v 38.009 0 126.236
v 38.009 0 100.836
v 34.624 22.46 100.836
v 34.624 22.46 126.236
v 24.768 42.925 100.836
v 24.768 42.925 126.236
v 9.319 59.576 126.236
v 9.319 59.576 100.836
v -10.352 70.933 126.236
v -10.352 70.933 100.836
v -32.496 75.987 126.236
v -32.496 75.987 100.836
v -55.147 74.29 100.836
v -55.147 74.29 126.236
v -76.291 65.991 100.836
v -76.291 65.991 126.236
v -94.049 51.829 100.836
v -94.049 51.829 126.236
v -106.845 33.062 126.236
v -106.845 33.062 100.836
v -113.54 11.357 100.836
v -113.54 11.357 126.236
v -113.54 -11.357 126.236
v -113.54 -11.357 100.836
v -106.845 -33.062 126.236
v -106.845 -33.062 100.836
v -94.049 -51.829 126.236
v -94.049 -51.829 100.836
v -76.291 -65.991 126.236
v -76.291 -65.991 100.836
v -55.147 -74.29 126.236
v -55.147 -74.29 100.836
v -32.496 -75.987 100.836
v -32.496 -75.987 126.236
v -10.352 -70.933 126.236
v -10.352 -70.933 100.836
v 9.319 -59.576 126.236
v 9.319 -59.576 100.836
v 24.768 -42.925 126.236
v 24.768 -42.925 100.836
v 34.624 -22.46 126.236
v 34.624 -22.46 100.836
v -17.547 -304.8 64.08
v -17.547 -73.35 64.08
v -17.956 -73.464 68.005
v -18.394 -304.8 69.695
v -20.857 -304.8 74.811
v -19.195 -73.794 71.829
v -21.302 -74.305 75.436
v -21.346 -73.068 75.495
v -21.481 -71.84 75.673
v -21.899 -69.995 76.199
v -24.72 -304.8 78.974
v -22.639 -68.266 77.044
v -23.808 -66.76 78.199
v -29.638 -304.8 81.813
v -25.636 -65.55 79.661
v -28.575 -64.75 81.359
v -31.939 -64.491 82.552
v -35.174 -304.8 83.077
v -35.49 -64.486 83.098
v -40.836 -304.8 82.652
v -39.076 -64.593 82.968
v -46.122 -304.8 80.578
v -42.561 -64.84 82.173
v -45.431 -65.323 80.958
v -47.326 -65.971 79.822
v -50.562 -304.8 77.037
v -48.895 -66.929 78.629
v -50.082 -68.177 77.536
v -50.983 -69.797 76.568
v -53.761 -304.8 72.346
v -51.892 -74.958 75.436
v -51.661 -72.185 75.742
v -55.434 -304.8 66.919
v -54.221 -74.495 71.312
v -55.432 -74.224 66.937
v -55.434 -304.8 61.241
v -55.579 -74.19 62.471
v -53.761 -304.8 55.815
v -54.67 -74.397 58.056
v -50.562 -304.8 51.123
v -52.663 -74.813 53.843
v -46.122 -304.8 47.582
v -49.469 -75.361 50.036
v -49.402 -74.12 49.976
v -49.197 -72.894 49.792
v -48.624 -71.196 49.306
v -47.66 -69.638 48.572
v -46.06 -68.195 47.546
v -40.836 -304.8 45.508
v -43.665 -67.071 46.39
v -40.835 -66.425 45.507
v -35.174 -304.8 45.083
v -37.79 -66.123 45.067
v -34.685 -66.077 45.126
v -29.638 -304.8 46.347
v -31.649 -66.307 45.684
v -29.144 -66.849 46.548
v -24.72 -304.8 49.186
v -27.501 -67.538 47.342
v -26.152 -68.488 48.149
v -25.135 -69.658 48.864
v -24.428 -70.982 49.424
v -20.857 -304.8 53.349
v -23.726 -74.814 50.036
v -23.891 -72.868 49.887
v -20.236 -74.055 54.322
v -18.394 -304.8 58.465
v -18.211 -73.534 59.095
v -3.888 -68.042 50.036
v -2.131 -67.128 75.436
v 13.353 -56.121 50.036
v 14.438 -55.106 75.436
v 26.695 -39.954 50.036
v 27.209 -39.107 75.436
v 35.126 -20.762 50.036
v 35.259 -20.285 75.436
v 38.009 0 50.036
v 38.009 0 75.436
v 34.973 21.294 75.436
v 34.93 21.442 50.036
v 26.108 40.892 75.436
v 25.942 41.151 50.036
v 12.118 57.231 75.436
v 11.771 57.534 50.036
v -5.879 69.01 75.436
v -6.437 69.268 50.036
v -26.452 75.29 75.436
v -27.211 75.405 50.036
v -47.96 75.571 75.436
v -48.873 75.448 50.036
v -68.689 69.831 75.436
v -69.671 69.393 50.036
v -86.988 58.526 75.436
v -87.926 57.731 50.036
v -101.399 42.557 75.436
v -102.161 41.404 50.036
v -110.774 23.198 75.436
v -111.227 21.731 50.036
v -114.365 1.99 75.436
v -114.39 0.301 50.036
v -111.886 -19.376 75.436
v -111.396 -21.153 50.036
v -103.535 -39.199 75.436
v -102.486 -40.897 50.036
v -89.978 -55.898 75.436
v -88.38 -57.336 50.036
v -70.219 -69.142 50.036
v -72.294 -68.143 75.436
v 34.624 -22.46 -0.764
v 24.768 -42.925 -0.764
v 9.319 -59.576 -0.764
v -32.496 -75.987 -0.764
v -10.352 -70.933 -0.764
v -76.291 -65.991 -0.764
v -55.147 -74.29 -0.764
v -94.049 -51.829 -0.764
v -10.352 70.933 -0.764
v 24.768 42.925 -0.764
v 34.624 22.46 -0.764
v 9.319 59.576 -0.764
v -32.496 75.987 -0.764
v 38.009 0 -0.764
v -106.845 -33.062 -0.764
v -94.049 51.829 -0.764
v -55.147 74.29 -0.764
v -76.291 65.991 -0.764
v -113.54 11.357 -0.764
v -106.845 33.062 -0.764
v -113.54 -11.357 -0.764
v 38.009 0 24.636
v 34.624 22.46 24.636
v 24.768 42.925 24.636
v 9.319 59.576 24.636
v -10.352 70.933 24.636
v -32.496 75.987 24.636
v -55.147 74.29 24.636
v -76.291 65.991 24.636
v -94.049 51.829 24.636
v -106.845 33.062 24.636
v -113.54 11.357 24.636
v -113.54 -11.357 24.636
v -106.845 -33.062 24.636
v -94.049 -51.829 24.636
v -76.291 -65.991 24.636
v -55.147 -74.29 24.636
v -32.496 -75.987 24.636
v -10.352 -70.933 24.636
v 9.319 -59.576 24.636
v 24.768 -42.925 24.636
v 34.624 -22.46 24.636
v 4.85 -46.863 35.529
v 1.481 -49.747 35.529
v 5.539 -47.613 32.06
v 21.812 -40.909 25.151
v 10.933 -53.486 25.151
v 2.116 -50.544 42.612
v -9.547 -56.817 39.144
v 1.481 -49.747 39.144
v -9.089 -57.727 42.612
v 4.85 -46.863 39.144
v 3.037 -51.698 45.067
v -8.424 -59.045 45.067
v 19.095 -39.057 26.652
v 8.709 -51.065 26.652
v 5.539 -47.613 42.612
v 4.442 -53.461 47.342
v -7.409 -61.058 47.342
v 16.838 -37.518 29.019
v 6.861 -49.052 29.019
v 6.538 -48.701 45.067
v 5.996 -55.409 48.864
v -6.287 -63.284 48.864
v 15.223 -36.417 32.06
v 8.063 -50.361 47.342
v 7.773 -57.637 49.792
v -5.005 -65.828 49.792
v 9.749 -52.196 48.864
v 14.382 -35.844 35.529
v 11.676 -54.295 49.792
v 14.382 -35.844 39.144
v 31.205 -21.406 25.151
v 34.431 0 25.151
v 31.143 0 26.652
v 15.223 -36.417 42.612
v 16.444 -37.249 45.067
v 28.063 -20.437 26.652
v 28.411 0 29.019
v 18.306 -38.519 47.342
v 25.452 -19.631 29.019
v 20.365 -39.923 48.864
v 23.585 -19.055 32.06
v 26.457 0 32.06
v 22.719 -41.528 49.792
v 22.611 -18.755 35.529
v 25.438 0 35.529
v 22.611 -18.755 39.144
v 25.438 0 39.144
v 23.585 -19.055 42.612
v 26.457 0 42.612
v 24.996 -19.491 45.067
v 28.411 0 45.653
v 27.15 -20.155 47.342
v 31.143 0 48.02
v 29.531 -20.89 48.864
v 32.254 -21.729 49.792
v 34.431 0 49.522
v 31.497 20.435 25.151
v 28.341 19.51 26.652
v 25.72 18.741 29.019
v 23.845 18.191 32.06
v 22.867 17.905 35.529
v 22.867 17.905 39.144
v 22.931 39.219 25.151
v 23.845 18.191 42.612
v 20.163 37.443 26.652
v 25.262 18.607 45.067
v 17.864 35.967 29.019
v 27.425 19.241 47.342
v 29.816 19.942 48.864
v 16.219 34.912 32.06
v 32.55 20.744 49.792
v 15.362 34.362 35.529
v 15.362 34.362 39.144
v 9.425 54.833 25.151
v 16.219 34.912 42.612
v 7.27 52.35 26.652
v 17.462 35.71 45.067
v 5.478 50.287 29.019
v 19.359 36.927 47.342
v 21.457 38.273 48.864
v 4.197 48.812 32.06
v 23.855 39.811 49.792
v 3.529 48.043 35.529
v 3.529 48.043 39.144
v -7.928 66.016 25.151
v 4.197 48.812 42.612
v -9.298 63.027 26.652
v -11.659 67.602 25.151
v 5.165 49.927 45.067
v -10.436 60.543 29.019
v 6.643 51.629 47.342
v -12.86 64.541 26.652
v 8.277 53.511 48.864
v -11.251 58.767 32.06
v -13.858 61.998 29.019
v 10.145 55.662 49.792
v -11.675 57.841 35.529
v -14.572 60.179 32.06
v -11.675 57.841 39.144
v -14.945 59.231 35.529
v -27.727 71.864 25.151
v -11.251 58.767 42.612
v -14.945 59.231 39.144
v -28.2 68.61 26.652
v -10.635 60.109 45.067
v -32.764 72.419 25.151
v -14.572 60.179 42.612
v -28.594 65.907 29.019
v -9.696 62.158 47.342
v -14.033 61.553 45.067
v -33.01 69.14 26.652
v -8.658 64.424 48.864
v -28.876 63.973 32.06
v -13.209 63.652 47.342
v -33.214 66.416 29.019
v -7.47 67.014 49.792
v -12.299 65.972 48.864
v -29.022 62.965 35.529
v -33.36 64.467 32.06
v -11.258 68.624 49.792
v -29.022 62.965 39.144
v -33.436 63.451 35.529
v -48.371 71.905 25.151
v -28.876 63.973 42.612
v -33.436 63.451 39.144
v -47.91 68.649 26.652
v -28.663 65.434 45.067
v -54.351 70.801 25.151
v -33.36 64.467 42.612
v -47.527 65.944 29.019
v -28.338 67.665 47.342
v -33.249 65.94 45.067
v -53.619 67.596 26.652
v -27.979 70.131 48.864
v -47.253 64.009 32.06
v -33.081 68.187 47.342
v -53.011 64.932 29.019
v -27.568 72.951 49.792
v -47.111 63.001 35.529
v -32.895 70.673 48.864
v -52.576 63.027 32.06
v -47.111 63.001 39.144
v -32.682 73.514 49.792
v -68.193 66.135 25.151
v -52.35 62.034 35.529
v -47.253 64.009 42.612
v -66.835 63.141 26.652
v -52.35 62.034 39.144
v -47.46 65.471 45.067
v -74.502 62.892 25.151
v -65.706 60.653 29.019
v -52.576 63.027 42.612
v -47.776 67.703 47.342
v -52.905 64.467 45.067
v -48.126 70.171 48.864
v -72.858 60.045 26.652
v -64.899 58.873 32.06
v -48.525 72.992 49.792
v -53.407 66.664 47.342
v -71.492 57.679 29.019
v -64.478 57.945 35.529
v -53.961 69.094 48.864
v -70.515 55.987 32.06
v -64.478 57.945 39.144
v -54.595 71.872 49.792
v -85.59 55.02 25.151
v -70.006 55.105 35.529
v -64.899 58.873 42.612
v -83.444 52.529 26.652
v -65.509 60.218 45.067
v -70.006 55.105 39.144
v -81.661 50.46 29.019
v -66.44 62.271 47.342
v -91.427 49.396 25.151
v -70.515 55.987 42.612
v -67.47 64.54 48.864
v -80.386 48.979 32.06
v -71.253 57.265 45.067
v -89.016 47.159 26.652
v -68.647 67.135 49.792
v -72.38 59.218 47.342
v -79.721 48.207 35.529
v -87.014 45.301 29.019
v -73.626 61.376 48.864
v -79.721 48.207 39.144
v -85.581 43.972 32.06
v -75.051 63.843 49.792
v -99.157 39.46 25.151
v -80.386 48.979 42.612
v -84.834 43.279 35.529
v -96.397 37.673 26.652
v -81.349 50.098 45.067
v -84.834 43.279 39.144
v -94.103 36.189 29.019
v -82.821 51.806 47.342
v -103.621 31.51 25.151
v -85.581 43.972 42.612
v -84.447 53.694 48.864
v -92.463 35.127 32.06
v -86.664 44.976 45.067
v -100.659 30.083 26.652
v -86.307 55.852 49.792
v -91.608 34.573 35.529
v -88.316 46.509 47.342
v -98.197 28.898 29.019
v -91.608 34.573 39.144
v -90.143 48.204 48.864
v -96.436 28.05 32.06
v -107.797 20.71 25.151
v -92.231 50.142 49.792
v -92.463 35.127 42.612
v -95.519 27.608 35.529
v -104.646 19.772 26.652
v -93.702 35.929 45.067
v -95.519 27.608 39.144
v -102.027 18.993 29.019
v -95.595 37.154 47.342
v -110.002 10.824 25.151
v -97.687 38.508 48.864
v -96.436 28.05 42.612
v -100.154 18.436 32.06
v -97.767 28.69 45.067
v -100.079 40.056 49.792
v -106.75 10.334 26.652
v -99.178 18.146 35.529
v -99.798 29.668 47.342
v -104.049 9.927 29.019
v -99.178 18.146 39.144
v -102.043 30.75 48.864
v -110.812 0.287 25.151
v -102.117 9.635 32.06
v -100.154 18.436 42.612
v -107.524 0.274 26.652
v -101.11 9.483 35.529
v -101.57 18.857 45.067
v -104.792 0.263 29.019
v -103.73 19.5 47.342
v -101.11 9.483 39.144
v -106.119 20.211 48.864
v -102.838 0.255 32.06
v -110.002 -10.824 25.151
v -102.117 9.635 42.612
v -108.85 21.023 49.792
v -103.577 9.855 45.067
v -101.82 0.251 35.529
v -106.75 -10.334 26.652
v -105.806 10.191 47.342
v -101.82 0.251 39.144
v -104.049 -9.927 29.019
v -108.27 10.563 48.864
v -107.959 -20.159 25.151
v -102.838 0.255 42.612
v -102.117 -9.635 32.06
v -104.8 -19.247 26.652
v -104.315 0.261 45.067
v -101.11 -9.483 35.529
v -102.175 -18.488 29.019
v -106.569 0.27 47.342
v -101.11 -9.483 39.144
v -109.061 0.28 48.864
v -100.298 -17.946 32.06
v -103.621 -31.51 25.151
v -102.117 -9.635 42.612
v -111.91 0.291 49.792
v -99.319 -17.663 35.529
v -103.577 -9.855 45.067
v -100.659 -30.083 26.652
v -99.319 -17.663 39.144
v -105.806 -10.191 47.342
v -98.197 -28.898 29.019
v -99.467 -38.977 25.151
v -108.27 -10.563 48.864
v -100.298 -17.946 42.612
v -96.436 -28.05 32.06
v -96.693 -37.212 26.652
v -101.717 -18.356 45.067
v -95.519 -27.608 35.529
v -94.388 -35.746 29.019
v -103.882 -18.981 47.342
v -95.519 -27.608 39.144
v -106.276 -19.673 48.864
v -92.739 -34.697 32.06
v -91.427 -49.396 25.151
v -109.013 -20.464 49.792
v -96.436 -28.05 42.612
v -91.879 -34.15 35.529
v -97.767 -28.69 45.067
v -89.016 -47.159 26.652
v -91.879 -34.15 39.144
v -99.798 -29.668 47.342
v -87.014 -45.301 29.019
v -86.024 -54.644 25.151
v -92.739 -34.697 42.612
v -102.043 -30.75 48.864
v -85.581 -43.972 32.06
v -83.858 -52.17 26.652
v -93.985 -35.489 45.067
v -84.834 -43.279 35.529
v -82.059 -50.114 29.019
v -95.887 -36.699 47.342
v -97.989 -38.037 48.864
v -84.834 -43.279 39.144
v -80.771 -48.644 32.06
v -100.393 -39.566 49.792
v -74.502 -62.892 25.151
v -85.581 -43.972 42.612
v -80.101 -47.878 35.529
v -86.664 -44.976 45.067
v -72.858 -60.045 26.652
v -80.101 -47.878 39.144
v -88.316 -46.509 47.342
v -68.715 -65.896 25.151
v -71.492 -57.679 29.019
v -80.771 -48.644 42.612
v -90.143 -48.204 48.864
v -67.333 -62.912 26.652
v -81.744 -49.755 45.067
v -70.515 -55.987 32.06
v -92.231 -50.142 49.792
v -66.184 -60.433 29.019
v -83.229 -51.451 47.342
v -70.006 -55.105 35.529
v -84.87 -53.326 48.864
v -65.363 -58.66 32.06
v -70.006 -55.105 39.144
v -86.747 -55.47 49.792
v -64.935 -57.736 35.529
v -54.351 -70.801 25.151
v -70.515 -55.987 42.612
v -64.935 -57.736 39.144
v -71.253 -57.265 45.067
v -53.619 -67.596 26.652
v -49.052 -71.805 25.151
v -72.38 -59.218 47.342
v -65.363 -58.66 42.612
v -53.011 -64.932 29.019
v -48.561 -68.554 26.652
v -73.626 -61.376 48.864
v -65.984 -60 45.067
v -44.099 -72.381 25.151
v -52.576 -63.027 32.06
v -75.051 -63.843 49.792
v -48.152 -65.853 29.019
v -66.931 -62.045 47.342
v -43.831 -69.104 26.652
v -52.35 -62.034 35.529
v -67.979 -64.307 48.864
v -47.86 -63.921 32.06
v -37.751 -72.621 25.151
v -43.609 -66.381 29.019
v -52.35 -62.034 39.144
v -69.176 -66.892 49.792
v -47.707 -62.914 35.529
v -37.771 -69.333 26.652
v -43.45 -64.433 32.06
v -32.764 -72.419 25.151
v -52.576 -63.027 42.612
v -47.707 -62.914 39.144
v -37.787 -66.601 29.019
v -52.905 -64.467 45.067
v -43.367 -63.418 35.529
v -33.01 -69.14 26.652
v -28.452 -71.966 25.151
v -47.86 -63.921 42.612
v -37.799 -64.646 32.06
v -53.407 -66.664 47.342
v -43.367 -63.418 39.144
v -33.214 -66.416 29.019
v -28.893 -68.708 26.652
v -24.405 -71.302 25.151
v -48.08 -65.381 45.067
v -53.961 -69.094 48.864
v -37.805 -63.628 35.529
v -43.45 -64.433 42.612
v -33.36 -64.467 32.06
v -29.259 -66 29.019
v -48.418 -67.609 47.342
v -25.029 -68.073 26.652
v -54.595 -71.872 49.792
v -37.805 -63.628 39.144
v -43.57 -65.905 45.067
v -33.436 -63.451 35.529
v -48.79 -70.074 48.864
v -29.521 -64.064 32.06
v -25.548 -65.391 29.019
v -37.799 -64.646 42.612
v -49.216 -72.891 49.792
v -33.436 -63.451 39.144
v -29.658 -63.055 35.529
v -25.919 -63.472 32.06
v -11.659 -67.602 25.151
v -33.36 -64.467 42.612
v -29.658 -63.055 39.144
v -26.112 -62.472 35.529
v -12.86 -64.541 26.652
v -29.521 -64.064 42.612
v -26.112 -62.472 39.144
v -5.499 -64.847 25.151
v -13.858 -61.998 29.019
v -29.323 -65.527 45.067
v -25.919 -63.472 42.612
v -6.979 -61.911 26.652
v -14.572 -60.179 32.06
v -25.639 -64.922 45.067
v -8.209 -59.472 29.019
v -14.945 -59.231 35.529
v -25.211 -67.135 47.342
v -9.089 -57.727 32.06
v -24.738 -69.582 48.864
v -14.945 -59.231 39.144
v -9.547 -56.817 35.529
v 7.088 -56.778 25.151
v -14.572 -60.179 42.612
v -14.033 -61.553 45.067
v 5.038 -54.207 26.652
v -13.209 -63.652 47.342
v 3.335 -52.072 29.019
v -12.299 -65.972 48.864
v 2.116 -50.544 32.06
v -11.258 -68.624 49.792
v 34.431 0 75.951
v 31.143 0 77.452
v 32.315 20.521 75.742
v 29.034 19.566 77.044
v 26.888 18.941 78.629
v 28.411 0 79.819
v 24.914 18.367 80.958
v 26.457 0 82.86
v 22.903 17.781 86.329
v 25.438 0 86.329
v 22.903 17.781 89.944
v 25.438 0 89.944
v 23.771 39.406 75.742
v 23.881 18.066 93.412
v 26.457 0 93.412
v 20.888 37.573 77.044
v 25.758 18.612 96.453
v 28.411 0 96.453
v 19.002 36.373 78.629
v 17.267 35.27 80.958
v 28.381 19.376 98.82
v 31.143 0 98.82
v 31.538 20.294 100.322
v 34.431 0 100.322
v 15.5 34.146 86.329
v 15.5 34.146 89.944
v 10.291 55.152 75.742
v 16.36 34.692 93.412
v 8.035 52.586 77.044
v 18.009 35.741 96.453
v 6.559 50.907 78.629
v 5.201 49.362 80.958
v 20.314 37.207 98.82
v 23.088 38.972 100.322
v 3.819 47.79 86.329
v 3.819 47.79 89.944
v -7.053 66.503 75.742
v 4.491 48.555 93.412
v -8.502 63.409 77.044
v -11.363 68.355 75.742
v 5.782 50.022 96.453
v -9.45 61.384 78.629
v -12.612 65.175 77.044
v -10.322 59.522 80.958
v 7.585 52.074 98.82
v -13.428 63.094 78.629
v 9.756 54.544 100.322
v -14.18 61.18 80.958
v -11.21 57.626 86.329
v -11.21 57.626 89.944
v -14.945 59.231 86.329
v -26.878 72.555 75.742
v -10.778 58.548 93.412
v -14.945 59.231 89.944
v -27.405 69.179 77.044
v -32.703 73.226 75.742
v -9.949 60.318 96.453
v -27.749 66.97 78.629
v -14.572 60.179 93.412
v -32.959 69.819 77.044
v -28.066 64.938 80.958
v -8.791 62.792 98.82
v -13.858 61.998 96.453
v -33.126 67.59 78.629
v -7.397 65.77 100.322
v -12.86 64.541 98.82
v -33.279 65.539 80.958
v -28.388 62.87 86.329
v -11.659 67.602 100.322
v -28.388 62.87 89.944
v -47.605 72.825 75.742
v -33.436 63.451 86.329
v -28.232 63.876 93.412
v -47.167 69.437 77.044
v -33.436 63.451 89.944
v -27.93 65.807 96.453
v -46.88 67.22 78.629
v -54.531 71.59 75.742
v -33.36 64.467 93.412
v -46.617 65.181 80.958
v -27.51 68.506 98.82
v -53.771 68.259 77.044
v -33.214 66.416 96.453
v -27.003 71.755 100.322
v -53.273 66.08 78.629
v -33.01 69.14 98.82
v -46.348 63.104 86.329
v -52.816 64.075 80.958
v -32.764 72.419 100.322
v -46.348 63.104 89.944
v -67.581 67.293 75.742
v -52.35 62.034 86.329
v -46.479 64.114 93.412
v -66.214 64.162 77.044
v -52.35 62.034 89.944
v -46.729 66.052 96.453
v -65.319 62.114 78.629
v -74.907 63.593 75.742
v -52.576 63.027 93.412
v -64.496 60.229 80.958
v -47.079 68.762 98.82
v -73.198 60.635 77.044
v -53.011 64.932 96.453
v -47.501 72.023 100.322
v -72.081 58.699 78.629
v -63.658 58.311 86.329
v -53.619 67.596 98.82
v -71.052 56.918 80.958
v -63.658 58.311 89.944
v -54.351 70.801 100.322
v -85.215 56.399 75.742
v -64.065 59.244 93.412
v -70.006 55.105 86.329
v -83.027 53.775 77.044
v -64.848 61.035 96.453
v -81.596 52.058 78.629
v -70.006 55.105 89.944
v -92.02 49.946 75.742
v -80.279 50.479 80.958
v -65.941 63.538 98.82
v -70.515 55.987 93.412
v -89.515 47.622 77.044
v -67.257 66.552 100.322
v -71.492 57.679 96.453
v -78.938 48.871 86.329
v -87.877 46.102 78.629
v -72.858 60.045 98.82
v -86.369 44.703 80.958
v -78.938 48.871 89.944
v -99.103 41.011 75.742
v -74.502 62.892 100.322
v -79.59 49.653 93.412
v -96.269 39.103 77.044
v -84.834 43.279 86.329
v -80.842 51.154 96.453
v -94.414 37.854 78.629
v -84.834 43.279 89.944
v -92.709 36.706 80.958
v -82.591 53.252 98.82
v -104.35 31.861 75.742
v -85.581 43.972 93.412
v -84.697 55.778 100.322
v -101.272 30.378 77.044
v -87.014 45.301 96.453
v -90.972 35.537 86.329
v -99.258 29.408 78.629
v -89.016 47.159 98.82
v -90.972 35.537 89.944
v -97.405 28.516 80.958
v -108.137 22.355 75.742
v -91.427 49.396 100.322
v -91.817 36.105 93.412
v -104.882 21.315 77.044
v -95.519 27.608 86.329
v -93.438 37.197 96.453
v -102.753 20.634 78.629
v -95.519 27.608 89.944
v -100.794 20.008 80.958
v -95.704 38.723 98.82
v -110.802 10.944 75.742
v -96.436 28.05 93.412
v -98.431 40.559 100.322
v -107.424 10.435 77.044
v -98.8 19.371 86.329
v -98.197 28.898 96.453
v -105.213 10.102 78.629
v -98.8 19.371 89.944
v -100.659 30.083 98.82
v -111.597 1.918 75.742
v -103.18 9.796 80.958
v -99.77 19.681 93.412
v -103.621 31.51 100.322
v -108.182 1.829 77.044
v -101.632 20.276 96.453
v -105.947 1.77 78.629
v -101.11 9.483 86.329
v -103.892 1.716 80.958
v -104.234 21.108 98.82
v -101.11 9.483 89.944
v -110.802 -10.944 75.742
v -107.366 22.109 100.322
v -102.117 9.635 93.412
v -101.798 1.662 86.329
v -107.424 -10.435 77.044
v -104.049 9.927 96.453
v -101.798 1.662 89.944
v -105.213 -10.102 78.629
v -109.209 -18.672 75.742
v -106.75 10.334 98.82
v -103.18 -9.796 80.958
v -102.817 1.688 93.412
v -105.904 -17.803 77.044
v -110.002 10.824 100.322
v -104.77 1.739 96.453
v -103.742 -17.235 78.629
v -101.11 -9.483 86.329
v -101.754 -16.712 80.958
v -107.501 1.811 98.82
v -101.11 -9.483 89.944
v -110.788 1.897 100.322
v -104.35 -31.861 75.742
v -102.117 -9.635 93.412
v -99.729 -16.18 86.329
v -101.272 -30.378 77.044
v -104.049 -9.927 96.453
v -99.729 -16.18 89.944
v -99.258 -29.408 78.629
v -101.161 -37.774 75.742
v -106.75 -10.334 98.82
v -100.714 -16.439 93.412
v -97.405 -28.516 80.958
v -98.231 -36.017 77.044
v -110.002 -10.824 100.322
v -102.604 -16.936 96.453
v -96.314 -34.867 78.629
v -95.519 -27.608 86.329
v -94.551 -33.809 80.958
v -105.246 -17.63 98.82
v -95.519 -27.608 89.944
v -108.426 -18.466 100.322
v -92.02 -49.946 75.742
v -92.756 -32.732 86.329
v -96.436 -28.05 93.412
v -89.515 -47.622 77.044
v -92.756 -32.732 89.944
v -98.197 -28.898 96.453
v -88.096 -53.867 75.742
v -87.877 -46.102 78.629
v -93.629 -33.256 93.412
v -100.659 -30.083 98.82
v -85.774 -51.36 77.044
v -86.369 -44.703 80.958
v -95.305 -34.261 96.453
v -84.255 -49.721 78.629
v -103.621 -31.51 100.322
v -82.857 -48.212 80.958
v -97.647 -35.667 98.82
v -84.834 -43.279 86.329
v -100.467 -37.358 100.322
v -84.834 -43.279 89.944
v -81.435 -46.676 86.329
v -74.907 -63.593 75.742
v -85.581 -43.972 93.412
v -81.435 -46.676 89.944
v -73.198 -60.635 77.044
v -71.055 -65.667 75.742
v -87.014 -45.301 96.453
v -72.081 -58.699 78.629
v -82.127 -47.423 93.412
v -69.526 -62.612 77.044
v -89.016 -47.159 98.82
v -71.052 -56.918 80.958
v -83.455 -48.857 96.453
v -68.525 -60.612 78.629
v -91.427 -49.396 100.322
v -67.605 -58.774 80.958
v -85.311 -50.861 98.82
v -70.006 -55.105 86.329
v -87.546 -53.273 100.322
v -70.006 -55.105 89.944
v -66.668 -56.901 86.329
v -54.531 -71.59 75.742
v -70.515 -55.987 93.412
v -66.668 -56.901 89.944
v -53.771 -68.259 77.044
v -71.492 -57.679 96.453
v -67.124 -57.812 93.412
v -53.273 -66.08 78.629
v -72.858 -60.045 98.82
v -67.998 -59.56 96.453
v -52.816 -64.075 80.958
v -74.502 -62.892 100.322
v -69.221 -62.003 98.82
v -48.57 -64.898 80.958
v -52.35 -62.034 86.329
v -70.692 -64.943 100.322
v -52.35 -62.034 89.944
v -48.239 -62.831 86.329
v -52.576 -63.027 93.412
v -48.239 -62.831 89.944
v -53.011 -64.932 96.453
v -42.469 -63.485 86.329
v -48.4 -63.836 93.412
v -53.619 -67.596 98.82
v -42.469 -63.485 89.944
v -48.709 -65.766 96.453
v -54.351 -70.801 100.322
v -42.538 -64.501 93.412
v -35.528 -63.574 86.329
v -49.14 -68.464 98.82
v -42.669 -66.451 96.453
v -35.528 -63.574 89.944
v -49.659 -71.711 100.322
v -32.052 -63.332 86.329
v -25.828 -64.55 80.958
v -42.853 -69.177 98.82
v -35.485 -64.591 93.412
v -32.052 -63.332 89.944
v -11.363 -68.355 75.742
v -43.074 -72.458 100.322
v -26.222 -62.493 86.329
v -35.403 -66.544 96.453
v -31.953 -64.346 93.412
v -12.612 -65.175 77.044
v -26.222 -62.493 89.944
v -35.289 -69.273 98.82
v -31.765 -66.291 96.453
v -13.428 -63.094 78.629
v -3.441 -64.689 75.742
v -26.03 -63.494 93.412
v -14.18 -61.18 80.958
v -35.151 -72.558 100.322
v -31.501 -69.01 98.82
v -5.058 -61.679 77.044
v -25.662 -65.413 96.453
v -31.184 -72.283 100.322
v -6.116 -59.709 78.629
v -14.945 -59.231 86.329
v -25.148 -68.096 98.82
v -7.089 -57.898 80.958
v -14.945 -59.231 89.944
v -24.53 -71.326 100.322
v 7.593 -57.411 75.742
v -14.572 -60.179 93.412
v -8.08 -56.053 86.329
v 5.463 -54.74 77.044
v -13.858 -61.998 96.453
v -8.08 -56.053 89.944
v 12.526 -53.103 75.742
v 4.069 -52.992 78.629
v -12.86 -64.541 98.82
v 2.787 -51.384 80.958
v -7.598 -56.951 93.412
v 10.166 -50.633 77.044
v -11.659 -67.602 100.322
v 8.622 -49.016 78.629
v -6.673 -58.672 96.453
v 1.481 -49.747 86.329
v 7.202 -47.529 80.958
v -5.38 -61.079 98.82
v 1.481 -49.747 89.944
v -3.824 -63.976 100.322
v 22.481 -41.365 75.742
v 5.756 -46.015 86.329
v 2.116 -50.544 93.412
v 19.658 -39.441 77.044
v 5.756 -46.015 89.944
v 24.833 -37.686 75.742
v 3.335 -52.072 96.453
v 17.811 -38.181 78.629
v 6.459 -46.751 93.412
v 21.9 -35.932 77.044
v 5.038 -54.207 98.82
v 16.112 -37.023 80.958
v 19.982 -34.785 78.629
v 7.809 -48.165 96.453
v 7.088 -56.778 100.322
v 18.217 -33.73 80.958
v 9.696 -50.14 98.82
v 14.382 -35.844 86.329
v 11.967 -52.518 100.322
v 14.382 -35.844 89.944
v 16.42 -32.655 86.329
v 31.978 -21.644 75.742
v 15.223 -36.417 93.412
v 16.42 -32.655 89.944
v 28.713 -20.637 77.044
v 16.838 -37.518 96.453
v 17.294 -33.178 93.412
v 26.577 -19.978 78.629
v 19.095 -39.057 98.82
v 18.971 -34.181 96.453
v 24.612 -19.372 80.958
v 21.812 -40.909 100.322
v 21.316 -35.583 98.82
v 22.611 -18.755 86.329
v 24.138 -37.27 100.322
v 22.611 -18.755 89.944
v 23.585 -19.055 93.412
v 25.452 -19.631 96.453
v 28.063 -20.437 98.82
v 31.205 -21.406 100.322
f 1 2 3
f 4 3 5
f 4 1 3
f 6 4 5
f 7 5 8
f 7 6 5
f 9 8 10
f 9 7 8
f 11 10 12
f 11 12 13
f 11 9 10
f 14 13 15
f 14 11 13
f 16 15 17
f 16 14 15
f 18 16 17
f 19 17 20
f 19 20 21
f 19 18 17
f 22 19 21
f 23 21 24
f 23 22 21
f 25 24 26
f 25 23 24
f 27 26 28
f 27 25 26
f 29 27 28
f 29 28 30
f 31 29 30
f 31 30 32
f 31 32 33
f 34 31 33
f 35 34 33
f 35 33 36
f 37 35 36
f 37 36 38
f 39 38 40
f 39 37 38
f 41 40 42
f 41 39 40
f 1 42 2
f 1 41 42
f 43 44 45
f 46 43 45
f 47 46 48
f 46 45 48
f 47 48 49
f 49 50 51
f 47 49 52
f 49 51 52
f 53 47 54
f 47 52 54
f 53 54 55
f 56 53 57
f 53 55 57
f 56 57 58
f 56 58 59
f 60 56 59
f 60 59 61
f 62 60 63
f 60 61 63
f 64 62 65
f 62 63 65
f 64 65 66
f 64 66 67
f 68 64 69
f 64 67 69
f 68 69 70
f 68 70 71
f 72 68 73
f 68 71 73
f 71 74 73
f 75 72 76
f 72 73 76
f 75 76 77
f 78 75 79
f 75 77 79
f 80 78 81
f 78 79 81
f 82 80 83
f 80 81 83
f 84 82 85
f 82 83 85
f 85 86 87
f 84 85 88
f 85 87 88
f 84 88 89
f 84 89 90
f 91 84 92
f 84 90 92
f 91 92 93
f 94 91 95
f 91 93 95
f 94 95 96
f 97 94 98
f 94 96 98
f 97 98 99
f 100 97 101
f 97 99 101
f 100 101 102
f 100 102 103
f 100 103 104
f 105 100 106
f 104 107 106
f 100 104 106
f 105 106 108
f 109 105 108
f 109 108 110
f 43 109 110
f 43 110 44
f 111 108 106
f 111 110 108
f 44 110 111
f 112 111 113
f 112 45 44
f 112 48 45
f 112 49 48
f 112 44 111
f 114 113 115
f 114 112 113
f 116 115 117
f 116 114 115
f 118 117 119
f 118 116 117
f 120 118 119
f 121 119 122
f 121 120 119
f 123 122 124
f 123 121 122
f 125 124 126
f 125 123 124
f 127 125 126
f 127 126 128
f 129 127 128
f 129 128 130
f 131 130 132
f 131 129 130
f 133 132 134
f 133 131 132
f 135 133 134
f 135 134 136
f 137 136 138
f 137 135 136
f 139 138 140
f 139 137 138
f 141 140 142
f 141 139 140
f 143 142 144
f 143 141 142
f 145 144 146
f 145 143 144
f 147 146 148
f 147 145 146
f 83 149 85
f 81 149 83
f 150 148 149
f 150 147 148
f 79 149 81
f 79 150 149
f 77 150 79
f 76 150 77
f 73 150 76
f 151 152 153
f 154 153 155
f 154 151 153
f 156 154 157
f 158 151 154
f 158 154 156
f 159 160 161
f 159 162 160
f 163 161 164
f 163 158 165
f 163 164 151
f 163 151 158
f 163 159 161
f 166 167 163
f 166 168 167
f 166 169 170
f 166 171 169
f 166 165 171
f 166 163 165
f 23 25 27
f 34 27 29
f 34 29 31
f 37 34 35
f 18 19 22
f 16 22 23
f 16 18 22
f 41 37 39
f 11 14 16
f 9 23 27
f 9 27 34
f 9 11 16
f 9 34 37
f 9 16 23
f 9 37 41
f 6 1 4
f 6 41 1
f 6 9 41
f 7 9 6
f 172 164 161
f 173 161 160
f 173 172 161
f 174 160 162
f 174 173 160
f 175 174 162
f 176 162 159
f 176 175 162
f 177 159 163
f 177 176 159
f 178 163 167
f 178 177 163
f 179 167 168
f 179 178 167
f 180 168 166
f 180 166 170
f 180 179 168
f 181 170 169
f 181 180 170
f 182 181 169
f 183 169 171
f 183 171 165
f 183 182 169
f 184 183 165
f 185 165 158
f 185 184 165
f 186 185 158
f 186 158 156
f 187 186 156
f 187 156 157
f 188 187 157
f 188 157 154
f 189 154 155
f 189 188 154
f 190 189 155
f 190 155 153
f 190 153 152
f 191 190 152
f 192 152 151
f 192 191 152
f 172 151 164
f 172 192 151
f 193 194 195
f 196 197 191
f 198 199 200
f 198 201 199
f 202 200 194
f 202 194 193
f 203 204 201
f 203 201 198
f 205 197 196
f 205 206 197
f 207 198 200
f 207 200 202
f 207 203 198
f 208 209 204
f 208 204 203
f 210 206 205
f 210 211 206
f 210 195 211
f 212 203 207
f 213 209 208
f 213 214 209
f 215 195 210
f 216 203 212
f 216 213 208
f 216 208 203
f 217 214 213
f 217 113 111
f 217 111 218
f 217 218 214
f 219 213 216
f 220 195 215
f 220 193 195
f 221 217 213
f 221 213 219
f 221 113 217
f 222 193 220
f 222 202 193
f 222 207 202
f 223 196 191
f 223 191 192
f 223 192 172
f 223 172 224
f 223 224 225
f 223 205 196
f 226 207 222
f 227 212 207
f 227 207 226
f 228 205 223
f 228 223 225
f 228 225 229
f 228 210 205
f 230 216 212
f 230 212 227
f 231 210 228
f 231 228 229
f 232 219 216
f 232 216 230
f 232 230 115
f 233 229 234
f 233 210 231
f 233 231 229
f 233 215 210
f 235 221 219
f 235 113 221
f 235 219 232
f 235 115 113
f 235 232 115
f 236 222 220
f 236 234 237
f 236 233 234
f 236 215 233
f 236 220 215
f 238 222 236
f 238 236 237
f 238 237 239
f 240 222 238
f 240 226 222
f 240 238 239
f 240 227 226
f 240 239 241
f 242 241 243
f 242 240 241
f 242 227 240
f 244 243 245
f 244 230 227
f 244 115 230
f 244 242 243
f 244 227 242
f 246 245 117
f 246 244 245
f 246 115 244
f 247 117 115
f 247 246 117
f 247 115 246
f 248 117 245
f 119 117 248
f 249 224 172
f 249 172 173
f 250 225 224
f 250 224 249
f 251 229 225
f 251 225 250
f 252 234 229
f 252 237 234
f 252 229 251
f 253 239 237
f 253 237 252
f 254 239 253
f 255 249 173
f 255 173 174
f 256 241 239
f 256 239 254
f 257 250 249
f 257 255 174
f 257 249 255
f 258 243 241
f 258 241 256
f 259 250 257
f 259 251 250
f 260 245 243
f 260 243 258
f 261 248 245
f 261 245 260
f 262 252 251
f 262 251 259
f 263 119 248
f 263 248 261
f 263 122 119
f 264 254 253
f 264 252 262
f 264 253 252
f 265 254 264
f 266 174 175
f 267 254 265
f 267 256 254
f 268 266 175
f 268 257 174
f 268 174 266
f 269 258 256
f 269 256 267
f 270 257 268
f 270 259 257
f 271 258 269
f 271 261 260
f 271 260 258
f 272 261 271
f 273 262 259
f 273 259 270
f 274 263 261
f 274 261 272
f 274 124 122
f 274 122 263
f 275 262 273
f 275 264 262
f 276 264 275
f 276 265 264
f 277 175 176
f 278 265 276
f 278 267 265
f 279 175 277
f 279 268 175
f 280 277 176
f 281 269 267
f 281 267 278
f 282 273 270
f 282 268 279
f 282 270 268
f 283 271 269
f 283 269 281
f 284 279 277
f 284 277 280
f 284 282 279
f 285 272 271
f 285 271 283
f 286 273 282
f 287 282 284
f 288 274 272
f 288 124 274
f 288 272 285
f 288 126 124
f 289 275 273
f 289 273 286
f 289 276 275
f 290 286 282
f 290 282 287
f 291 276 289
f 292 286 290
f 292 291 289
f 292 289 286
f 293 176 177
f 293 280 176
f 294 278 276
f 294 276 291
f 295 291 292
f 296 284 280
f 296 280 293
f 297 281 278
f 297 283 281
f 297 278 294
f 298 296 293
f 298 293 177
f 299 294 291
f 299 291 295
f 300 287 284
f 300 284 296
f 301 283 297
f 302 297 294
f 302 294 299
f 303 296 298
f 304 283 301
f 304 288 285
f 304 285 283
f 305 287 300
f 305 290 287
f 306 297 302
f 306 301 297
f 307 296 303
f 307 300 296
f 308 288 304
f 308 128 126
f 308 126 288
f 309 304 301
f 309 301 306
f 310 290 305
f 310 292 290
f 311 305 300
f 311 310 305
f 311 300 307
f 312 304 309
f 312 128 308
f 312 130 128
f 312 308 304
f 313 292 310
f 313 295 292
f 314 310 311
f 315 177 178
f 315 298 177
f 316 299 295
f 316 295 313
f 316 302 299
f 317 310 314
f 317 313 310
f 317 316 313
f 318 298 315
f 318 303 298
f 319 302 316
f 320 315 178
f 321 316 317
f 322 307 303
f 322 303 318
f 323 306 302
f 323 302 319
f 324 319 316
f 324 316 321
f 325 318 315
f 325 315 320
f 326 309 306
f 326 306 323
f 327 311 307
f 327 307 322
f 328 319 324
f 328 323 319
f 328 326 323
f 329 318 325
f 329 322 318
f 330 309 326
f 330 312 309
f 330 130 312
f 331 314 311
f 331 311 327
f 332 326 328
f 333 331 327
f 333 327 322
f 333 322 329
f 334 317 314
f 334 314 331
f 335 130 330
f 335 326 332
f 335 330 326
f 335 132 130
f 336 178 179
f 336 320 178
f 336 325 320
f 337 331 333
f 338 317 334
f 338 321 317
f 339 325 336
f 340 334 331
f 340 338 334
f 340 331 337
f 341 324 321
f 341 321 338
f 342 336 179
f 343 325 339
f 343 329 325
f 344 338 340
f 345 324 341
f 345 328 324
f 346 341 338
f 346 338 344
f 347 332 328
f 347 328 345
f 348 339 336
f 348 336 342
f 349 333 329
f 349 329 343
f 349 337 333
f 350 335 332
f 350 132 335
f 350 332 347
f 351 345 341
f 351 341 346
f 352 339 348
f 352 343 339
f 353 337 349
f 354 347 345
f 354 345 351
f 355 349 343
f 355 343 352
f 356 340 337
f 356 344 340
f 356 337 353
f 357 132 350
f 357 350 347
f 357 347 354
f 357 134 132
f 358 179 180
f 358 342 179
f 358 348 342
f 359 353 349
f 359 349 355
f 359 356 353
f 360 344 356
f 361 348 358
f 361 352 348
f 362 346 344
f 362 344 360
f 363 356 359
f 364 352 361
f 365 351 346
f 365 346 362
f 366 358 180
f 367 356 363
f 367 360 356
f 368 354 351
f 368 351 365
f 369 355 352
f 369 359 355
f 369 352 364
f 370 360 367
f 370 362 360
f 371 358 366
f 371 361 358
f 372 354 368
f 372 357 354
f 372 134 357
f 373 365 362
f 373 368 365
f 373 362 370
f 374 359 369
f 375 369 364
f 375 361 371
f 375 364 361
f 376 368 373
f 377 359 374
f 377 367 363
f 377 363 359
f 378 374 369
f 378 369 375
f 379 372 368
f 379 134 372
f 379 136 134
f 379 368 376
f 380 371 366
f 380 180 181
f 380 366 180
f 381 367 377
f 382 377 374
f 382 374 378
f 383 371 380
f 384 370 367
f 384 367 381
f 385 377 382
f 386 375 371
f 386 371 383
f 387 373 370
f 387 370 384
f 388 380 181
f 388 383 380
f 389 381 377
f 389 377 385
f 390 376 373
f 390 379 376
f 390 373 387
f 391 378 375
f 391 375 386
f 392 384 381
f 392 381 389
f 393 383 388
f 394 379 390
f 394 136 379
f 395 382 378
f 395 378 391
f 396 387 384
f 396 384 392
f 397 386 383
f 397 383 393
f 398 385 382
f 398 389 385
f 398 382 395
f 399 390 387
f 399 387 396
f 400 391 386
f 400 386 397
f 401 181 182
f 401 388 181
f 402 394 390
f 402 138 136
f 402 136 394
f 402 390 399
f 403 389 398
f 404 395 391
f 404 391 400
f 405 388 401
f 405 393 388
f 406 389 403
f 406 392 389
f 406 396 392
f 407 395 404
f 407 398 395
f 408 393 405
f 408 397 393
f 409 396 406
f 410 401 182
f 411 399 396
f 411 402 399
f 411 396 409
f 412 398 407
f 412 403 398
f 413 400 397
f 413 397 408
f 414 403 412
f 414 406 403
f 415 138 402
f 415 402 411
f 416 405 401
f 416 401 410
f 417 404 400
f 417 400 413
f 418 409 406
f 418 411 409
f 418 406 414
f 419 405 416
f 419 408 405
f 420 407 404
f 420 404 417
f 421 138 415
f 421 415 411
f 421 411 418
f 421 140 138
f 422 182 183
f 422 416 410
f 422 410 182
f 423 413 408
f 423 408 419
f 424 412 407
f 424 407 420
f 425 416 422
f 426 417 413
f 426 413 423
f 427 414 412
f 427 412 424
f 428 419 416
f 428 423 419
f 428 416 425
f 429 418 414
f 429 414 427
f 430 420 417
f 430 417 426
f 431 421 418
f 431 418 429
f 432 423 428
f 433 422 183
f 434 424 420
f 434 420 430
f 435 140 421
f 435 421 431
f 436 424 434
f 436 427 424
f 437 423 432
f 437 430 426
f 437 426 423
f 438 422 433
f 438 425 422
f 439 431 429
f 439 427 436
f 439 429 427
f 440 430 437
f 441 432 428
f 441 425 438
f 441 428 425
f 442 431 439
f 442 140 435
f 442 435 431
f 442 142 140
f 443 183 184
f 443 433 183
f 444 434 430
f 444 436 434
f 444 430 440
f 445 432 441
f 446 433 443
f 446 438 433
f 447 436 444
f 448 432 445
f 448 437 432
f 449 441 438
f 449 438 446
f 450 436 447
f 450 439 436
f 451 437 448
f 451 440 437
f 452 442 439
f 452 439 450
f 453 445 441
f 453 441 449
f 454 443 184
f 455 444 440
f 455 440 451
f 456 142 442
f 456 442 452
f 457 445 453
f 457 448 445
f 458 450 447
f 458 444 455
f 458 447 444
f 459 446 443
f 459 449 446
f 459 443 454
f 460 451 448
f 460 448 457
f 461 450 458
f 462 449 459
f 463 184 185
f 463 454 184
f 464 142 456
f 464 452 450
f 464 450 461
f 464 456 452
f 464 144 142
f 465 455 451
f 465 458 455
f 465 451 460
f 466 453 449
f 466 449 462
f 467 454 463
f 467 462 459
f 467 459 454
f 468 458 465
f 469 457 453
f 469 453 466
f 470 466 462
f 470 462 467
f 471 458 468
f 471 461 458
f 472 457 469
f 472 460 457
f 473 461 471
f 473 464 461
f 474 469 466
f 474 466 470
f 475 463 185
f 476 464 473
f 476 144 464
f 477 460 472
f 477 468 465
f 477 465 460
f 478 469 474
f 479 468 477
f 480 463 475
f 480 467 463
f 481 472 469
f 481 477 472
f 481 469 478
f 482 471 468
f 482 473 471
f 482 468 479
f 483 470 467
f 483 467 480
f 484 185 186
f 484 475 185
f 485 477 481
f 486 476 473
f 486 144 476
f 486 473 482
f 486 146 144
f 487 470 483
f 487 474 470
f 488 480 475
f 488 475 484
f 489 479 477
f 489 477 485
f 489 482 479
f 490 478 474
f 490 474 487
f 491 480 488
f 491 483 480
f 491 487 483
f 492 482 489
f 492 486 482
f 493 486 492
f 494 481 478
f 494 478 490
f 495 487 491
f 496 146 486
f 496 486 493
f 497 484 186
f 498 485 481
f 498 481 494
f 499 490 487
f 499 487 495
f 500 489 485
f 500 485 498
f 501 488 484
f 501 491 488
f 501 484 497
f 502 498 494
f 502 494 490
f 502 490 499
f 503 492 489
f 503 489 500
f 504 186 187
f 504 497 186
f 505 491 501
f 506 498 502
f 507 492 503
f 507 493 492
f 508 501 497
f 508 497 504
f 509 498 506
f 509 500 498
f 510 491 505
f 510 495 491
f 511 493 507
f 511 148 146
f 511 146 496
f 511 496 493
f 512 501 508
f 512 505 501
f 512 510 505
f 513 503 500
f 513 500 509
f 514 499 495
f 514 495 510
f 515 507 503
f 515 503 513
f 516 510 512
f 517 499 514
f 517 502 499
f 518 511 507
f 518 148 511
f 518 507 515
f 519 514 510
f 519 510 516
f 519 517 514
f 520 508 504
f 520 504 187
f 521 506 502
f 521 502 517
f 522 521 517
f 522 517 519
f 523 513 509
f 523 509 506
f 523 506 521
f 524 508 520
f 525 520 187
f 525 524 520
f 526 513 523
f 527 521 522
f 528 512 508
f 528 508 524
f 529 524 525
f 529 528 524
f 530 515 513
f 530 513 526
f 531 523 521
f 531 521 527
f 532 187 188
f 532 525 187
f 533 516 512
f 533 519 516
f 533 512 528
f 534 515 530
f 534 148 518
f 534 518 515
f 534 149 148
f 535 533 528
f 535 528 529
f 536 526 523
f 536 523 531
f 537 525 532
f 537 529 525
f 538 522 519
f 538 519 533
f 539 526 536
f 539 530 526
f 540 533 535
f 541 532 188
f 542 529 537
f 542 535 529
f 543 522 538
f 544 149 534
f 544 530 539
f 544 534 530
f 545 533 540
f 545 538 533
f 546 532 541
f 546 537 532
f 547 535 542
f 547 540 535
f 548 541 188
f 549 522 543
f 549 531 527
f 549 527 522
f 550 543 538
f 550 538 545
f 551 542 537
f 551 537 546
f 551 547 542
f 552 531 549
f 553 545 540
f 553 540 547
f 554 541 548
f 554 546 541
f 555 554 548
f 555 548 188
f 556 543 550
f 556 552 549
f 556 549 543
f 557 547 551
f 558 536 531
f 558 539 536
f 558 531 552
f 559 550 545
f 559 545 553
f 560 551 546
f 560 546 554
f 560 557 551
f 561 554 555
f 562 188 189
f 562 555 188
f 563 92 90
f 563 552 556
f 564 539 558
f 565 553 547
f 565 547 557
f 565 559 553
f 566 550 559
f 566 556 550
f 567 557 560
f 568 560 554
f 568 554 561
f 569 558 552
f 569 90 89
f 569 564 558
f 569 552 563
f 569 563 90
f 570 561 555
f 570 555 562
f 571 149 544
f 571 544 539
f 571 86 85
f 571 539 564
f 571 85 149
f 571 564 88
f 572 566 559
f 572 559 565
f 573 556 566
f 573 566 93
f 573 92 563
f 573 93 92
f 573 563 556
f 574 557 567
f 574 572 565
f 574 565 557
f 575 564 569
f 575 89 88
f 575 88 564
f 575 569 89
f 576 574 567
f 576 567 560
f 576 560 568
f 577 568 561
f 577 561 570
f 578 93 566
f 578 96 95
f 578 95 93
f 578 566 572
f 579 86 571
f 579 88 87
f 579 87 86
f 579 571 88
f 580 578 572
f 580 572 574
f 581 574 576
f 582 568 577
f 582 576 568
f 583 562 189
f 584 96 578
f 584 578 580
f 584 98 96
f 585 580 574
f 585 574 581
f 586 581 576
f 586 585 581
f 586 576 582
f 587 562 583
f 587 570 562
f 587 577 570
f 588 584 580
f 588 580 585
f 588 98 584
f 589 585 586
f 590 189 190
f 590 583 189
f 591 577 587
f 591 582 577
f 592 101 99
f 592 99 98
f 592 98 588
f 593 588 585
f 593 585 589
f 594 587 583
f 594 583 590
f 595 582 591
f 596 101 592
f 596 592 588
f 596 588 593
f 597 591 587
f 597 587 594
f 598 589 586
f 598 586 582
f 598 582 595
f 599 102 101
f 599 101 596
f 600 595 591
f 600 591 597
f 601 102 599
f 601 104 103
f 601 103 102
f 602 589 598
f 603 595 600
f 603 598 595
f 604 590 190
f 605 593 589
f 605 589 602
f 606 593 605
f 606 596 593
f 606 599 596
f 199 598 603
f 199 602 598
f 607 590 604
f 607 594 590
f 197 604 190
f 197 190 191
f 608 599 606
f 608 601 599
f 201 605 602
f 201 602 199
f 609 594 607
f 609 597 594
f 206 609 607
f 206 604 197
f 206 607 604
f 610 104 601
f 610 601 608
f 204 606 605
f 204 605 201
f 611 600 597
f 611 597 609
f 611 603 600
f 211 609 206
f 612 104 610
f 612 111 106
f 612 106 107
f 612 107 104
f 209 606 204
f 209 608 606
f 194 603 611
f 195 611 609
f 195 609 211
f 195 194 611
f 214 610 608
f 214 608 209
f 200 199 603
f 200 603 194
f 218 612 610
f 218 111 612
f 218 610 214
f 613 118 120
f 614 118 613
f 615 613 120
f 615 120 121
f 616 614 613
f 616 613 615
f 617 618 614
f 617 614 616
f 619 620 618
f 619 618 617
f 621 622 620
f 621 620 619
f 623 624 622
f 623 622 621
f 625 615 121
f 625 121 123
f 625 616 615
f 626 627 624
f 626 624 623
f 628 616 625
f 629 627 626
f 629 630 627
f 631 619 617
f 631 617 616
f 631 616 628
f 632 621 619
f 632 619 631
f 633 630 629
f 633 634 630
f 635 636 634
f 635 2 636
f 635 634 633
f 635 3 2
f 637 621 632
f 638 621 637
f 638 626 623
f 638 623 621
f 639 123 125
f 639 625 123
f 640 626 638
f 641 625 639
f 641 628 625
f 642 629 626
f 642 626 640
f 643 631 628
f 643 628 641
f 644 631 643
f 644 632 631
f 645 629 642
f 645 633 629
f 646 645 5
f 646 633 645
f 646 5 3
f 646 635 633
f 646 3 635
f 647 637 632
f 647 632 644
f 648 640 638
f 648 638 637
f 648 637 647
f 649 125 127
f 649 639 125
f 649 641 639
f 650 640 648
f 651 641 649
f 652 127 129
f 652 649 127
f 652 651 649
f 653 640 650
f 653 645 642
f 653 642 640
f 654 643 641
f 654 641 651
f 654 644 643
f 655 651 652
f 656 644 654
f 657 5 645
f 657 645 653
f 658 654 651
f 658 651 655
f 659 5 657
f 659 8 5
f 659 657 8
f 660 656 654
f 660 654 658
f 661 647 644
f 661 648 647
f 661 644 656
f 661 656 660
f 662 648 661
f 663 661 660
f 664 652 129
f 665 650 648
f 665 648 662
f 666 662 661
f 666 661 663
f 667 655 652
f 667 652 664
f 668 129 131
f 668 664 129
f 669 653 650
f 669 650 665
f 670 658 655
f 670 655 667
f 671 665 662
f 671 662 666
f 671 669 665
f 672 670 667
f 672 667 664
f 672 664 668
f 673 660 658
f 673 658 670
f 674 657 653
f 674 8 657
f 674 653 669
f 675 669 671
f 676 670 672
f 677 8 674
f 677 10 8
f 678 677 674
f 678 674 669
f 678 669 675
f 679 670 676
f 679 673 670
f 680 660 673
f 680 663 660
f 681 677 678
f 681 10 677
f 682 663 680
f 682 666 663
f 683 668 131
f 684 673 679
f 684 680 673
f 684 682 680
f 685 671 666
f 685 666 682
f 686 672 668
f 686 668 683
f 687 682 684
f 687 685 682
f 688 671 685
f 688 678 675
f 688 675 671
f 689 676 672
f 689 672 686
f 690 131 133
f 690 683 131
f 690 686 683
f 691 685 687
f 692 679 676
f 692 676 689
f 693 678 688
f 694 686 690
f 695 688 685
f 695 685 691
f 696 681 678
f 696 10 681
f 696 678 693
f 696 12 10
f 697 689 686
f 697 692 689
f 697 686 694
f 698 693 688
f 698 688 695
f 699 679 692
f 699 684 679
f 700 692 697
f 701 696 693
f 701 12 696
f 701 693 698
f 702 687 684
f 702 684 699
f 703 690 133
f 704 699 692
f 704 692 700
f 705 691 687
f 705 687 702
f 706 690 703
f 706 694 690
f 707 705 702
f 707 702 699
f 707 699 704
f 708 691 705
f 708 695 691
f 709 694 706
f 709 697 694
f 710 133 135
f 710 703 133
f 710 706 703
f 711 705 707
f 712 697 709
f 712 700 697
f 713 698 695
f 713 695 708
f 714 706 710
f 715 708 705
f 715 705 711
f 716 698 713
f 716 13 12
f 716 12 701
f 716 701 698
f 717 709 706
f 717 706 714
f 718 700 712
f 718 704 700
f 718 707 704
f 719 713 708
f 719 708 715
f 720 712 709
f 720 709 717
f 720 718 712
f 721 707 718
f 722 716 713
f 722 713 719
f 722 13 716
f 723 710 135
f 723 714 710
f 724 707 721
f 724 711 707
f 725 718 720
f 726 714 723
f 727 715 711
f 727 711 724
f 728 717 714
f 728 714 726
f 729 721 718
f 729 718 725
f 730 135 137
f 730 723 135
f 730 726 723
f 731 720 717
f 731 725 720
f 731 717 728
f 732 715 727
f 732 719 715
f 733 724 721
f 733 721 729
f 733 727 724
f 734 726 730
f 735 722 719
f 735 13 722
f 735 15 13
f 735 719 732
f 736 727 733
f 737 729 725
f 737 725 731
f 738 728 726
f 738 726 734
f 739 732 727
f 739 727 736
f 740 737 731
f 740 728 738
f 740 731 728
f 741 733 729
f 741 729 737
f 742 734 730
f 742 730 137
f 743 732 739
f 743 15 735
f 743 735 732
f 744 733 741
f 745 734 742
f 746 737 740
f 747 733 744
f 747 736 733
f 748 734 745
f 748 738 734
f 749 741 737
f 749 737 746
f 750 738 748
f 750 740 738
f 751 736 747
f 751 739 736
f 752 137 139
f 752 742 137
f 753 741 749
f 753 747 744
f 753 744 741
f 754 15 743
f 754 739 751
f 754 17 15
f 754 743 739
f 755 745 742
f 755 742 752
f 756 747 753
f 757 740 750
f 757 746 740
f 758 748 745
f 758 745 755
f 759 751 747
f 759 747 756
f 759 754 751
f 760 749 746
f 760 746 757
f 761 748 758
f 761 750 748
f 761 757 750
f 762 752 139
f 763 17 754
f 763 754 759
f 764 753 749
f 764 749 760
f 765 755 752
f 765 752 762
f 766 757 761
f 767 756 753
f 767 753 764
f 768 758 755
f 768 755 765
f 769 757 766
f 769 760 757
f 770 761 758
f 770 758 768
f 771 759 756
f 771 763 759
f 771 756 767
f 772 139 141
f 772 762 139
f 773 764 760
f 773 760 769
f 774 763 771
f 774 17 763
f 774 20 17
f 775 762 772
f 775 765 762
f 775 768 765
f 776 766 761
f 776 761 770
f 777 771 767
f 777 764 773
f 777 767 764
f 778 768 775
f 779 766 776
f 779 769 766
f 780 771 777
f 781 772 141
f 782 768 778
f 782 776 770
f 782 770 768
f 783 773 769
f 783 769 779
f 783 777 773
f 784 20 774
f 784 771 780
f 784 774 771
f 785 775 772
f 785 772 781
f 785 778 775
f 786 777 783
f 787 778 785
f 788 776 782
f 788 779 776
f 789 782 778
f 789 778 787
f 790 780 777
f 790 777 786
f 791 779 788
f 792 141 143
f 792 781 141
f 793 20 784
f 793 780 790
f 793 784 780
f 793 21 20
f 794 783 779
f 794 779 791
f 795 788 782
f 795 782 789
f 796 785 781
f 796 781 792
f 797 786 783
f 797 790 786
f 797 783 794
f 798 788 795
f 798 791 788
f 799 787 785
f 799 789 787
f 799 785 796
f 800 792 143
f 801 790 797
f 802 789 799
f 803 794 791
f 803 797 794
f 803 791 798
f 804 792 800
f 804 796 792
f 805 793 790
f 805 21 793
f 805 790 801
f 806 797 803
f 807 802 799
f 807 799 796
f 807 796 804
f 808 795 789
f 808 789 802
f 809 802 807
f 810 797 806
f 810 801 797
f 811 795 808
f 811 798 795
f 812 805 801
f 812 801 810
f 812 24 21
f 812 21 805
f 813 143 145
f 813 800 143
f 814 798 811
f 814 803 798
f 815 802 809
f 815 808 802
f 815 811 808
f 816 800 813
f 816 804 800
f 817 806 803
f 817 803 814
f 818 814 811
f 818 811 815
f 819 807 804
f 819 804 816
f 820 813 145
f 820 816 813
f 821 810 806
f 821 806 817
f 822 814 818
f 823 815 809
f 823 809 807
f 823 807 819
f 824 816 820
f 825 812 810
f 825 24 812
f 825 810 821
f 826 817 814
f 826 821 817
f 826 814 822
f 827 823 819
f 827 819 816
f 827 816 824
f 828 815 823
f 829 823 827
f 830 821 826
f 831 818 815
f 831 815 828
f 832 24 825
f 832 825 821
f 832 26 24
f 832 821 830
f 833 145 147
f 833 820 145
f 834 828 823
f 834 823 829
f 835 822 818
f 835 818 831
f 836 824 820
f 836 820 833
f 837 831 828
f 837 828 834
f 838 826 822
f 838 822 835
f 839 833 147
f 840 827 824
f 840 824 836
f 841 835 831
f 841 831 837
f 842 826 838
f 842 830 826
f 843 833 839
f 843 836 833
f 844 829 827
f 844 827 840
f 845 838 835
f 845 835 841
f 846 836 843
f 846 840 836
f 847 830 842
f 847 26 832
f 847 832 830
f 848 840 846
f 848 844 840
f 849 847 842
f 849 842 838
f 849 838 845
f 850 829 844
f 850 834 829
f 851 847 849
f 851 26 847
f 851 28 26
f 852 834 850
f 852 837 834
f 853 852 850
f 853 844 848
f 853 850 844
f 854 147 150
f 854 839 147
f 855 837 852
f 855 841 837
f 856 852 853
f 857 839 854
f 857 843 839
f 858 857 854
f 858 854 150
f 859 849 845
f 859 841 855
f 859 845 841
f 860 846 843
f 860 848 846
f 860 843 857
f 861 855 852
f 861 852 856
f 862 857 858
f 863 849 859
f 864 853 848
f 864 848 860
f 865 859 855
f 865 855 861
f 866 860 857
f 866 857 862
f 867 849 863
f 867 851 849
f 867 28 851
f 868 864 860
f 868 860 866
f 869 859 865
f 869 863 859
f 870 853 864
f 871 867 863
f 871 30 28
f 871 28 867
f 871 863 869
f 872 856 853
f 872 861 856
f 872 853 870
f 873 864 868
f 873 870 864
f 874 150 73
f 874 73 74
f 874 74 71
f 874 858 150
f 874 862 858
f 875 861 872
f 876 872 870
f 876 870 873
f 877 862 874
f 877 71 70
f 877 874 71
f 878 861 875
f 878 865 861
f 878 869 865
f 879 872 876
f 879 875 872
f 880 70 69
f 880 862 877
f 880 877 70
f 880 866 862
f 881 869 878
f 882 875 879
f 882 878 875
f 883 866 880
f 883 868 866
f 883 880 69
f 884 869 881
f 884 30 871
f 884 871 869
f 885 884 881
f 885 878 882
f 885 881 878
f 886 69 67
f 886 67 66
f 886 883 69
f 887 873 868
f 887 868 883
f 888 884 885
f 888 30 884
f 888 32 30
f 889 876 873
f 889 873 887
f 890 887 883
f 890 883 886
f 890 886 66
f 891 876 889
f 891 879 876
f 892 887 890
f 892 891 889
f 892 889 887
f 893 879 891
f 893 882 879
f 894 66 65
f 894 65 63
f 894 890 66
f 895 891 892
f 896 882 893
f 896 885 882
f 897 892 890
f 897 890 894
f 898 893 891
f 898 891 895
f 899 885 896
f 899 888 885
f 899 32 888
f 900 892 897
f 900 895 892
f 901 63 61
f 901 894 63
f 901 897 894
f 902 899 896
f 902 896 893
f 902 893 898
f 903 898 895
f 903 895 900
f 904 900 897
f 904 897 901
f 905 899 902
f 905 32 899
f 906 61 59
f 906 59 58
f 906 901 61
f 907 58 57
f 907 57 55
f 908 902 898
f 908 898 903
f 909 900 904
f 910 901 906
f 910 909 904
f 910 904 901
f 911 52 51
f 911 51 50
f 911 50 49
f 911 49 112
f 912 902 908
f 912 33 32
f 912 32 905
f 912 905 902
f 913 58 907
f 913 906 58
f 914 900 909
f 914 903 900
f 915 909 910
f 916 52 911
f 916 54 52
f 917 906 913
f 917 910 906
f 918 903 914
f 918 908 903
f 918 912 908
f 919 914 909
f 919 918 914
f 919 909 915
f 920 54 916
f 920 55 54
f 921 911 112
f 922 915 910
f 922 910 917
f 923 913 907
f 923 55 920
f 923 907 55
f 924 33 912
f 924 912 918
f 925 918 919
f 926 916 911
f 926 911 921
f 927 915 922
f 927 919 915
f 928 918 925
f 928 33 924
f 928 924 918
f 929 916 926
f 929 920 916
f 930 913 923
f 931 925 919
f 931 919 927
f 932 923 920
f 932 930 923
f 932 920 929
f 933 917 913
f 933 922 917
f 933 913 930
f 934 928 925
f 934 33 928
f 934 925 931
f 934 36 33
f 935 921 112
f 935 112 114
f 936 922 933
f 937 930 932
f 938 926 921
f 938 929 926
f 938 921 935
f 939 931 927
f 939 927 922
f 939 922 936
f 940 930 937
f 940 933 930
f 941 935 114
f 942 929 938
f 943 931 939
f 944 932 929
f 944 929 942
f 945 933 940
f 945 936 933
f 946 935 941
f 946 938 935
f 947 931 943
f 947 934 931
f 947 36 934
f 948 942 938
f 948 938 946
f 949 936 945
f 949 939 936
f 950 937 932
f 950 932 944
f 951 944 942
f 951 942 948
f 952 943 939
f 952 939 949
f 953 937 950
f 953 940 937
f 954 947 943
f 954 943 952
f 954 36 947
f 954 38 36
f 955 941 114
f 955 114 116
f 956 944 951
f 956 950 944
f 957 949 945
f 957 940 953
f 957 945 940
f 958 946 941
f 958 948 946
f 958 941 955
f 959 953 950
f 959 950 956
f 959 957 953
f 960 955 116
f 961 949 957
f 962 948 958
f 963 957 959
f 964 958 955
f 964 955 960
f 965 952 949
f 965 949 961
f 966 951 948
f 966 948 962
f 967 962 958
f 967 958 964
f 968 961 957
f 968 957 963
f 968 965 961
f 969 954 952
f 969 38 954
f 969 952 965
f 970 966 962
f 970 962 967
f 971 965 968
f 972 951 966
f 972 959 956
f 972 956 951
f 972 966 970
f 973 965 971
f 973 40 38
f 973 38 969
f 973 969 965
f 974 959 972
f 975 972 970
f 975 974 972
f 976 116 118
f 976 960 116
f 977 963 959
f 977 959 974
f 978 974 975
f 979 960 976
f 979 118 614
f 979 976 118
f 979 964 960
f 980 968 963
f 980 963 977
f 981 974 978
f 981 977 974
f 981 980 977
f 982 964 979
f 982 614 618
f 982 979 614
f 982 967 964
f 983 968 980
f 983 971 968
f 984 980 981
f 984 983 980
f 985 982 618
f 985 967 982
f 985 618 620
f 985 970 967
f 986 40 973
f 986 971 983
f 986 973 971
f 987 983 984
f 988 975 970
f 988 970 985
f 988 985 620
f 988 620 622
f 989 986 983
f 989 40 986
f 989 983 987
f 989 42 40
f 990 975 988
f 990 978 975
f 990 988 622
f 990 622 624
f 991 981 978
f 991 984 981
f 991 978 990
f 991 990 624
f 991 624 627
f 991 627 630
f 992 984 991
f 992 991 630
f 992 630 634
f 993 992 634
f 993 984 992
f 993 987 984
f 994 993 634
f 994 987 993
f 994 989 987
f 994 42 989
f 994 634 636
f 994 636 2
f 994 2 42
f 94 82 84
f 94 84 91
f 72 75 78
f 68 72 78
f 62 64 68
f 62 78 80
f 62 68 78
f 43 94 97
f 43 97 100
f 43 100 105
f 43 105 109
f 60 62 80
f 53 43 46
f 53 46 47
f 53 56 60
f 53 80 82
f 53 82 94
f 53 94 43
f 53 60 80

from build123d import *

# Parameters (mm, degrees)
F2_R     = 19.05
F3_DEPTH = 304.8


with BuildPart() as f1:
    # F0 (on Front) → F1 (revolve)
    with BuildSketch(Plane.XZ):
        with BuildLine():
            Line((-38.190931, -0.763819), (38.009069, -0.763819))
            Line((38.009069, -0.763819), (38.009069, 24.636181))
            ThreePointArc((38.009069, 24.636181), (25.309069, 37.336181), (38.009069, 50.036181))
            Line((38.009069, 50.036181), (38.009069, 75.436181))
            ThreePointArc((38.009069, 75.436181), (25.309069, 88.136181), (38.009069, 100.836181))
            Line((38.009069, 100.836181), (38.009069, 126.236181))
            Line((38.009069, 126.236181), (-38.190931, 126.236181))
            Line((-38.190931, 126.236181), (-38.190931, -0.763819))
        make_face()
    revolve(axis=Axis((-38.190931, 0, 62.736181), (0, 0, 1)))

    # F2 (on Front) → F3 (join)
    with BuildSketch(Plane.XZ):
        with Locations((-36.597256, 64.08006)):
            Circle(F2_R)
    extrude(amount=F3_DEPTH)


solid = f1.part
